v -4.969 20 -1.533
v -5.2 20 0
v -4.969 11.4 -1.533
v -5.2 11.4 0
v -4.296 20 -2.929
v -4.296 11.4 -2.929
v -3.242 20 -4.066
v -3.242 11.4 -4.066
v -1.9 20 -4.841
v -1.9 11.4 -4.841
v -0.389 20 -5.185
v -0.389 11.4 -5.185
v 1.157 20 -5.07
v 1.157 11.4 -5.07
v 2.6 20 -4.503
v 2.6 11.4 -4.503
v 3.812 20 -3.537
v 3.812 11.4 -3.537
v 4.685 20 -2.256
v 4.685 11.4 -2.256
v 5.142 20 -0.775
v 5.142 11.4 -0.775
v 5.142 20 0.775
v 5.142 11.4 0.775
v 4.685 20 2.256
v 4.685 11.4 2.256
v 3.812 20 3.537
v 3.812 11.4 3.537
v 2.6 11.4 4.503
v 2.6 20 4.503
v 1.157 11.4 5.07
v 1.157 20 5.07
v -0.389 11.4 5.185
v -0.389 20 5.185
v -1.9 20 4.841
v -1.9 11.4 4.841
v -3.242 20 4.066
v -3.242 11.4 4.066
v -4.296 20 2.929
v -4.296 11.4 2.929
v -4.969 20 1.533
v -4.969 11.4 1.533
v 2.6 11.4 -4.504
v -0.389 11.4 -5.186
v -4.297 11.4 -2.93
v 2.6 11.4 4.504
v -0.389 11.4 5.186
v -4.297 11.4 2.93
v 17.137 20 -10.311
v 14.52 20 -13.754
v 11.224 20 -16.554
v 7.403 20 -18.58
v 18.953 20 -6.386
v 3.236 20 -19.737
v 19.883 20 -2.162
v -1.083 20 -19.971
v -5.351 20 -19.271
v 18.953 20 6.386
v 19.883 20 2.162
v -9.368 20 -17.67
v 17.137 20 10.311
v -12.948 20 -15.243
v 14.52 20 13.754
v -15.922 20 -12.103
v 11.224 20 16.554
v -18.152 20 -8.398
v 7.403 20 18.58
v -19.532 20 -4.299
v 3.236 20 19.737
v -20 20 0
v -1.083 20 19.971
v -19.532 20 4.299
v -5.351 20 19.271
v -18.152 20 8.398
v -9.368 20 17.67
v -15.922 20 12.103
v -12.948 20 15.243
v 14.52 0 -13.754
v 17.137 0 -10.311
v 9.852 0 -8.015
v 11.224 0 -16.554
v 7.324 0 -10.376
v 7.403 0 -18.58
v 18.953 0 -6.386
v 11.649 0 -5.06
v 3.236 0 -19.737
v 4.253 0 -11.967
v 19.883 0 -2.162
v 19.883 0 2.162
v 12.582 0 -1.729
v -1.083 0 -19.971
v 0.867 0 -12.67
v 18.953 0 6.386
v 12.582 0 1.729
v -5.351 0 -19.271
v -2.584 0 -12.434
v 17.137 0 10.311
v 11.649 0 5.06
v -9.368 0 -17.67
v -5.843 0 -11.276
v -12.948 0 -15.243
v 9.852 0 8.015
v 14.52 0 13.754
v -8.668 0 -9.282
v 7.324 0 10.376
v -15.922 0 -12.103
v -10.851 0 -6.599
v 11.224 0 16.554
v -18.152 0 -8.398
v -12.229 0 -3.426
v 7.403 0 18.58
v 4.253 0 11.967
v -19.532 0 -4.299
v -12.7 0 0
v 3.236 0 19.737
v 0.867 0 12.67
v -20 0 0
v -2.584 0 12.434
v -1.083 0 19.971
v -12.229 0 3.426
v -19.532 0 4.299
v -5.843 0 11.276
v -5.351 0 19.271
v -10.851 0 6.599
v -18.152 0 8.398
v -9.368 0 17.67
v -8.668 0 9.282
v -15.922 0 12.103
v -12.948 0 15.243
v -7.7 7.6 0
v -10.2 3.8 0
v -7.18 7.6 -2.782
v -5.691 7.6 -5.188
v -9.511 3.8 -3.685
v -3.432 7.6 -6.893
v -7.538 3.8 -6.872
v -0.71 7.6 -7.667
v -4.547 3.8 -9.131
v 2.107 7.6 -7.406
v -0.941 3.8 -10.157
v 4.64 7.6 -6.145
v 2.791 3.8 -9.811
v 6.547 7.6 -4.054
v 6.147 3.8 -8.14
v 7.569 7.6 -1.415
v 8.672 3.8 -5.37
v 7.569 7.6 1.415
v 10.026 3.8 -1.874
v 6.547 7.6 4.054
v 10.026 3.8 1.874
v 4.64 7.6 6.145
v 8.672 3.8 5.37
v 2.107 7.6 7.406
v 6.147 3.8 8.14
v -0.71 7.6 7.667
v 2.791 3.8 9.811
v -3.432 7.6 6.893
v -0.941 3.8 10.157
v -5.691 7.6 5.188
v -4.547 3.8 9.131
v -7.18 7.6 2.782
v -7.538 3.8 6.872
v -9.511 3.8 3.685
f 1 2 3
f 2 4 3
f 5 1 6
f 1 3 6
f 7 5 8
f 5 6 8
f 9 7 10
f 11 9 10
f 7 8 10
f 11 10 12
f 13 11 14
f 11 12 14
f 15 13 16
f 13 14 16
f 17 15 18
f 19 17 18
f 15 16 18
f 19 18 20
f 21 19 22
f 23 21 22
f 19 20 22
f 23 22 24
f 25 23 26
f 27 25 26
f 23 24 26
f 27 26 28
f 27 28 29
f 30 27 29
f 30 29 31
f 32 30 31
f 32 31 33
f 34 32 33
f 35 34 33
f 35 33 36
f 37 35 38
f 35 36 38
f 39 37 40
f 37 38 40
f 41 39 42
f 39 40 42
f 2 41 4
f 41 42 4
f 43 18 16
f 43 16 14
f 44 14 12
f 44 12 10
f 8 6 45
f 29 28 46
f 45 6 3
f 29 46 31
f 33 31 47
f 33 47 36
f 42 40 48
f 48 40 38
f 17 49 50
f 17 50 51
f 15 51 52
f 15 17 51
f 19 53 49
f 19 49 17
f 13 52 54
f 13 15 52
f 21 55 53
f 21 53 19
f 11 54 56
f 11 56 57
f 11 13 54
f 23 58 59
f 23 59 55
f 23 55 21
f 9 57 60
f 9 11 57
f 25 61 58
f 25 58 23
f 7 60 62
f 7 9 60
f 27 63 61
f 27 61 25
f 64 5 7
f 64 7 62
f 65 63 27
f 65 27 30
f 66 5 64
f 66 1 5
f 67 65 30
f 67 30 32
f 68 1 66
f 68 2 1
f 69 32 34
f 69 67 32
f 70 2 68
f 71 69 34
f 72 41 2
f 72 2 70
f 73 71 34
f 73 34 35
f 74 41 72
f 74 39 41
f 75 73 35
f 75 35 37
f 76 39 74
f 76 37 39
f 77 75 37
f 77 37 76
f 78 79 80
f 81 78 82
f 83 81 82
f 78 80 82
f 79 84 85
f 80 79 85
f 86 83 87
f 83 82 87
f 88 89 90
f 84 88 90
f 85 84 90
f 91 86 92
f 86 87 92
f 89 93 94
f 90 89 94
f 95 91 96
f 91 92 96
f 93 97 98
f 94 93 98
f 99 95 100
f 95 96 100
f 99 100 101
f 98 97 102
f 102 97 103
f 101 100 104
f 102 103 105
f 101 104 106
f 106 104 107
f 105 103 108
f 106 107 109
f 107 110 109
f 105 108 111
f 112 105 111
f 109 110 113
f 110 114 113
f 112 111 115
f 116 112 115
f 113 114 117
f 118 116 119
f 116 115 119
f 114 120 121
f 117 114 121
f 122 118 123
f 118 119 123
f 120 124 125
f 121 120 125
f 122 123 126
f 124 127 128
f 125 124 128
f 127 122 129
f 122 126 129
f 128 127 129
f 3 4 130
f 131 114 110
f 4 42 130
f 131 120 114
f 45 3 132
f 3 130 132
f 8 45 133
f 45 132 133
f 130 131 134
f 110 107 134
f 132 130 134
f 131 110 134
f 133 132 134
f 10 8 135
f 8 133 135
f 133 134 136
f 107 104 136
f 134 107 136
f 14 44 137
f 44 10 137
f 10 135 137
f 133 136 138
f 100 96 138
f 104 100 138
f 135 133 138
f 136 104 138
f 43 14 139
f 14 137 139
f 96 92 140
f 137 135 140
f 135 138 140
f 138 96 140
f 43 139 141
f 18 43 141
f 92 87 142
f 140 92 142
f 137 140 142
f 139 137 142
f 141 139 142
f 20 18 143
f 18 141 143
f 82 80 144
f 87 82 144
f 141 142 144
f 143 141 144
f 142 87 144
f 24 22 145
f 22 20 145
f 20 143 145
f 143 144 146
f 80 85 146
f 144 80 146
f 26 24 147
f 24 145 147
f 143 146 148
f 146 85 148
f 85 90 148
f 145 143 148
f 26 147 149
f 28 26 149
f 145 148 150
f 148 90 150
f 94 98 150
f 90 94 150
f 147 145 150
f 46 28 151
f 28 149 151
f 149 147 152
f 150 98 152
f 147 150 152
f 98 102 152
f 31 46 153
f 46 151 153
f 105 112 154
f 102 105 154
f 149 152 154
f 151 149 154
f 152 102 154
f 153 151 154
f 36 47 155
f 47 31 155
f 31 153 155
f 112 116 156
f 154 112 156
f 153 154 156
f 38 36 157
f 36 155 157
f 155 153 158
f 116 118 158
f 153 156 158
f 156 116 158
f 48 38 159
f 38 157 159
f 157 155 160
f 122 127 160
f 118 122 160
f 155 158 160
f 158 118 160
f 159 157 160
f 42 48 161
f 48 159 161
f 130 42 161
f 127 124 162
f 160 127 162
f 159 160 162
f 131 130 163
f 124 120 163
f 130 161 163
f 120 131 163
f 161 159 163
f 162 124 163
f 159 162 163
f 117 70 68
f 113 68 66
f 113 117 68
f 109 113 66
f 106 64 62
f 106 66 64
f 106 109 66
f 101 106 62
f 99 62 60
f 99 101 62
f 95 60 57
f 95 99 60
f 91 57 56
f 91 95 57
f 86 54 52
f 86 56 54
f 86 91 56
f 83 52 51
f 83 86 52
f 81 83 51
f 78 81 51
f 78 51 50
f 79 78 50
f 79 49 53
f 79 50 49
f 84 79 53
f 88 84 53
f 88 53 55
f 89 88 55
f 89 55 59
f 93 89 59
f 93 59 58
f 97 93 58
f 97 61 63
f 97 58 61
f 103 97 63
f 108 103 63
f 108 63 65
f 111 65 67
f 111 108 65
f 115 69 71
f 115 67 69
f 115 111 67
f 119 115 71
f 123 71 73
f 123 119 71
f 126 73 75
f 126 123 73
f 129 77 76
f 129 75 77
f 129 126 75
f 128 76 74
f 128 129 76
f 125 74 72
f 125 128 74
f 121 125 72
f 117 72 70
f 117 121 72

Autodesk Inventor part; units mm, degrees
ref_plane "YZ Plane" through (0, 0, 0) normal (1, 0, 0) x (0, 1, 0)
ref_plane "XZ Plane" through (0, 0, 0) normal (0, 1, 0) x (-1, 0, 0)
ref_plane "XY Plane" through (0, 0, 0) normal (0, 0, 1) x (1, 0, 0)
sketch "Sketch1" plane through (0, 0, 0) normal (0, 1, 0) x (-1, 0, 0)
  circle A0 centre (0, 0) radius 20
  circle A1 centre (0, 0) radius 12.7
  circle A2 centre (0, 0) radius 5.2
  dimension "d1" = 40
  dimension "d14" = 25.4
  dimension "d15" = 10.4
extrude "Extrusion1" add sketch "Sketch1" along normal blind 20 contours A0 | A1 | A2
extrude "Extrusion2" cut sketch "Sketch1" along normal blind 11.4 contours A1 | A2
extrude "Extrusion3" cut sketch "Sketch1" along normal blind 30 contours A2
chamfer "Chamfer2" distance 11.4 distance2 7.5 1 edges at (12.7, 11.4, 0) measured on face at (-12.5355, 7.6, -2.0372)
properties part number "5. ring"
